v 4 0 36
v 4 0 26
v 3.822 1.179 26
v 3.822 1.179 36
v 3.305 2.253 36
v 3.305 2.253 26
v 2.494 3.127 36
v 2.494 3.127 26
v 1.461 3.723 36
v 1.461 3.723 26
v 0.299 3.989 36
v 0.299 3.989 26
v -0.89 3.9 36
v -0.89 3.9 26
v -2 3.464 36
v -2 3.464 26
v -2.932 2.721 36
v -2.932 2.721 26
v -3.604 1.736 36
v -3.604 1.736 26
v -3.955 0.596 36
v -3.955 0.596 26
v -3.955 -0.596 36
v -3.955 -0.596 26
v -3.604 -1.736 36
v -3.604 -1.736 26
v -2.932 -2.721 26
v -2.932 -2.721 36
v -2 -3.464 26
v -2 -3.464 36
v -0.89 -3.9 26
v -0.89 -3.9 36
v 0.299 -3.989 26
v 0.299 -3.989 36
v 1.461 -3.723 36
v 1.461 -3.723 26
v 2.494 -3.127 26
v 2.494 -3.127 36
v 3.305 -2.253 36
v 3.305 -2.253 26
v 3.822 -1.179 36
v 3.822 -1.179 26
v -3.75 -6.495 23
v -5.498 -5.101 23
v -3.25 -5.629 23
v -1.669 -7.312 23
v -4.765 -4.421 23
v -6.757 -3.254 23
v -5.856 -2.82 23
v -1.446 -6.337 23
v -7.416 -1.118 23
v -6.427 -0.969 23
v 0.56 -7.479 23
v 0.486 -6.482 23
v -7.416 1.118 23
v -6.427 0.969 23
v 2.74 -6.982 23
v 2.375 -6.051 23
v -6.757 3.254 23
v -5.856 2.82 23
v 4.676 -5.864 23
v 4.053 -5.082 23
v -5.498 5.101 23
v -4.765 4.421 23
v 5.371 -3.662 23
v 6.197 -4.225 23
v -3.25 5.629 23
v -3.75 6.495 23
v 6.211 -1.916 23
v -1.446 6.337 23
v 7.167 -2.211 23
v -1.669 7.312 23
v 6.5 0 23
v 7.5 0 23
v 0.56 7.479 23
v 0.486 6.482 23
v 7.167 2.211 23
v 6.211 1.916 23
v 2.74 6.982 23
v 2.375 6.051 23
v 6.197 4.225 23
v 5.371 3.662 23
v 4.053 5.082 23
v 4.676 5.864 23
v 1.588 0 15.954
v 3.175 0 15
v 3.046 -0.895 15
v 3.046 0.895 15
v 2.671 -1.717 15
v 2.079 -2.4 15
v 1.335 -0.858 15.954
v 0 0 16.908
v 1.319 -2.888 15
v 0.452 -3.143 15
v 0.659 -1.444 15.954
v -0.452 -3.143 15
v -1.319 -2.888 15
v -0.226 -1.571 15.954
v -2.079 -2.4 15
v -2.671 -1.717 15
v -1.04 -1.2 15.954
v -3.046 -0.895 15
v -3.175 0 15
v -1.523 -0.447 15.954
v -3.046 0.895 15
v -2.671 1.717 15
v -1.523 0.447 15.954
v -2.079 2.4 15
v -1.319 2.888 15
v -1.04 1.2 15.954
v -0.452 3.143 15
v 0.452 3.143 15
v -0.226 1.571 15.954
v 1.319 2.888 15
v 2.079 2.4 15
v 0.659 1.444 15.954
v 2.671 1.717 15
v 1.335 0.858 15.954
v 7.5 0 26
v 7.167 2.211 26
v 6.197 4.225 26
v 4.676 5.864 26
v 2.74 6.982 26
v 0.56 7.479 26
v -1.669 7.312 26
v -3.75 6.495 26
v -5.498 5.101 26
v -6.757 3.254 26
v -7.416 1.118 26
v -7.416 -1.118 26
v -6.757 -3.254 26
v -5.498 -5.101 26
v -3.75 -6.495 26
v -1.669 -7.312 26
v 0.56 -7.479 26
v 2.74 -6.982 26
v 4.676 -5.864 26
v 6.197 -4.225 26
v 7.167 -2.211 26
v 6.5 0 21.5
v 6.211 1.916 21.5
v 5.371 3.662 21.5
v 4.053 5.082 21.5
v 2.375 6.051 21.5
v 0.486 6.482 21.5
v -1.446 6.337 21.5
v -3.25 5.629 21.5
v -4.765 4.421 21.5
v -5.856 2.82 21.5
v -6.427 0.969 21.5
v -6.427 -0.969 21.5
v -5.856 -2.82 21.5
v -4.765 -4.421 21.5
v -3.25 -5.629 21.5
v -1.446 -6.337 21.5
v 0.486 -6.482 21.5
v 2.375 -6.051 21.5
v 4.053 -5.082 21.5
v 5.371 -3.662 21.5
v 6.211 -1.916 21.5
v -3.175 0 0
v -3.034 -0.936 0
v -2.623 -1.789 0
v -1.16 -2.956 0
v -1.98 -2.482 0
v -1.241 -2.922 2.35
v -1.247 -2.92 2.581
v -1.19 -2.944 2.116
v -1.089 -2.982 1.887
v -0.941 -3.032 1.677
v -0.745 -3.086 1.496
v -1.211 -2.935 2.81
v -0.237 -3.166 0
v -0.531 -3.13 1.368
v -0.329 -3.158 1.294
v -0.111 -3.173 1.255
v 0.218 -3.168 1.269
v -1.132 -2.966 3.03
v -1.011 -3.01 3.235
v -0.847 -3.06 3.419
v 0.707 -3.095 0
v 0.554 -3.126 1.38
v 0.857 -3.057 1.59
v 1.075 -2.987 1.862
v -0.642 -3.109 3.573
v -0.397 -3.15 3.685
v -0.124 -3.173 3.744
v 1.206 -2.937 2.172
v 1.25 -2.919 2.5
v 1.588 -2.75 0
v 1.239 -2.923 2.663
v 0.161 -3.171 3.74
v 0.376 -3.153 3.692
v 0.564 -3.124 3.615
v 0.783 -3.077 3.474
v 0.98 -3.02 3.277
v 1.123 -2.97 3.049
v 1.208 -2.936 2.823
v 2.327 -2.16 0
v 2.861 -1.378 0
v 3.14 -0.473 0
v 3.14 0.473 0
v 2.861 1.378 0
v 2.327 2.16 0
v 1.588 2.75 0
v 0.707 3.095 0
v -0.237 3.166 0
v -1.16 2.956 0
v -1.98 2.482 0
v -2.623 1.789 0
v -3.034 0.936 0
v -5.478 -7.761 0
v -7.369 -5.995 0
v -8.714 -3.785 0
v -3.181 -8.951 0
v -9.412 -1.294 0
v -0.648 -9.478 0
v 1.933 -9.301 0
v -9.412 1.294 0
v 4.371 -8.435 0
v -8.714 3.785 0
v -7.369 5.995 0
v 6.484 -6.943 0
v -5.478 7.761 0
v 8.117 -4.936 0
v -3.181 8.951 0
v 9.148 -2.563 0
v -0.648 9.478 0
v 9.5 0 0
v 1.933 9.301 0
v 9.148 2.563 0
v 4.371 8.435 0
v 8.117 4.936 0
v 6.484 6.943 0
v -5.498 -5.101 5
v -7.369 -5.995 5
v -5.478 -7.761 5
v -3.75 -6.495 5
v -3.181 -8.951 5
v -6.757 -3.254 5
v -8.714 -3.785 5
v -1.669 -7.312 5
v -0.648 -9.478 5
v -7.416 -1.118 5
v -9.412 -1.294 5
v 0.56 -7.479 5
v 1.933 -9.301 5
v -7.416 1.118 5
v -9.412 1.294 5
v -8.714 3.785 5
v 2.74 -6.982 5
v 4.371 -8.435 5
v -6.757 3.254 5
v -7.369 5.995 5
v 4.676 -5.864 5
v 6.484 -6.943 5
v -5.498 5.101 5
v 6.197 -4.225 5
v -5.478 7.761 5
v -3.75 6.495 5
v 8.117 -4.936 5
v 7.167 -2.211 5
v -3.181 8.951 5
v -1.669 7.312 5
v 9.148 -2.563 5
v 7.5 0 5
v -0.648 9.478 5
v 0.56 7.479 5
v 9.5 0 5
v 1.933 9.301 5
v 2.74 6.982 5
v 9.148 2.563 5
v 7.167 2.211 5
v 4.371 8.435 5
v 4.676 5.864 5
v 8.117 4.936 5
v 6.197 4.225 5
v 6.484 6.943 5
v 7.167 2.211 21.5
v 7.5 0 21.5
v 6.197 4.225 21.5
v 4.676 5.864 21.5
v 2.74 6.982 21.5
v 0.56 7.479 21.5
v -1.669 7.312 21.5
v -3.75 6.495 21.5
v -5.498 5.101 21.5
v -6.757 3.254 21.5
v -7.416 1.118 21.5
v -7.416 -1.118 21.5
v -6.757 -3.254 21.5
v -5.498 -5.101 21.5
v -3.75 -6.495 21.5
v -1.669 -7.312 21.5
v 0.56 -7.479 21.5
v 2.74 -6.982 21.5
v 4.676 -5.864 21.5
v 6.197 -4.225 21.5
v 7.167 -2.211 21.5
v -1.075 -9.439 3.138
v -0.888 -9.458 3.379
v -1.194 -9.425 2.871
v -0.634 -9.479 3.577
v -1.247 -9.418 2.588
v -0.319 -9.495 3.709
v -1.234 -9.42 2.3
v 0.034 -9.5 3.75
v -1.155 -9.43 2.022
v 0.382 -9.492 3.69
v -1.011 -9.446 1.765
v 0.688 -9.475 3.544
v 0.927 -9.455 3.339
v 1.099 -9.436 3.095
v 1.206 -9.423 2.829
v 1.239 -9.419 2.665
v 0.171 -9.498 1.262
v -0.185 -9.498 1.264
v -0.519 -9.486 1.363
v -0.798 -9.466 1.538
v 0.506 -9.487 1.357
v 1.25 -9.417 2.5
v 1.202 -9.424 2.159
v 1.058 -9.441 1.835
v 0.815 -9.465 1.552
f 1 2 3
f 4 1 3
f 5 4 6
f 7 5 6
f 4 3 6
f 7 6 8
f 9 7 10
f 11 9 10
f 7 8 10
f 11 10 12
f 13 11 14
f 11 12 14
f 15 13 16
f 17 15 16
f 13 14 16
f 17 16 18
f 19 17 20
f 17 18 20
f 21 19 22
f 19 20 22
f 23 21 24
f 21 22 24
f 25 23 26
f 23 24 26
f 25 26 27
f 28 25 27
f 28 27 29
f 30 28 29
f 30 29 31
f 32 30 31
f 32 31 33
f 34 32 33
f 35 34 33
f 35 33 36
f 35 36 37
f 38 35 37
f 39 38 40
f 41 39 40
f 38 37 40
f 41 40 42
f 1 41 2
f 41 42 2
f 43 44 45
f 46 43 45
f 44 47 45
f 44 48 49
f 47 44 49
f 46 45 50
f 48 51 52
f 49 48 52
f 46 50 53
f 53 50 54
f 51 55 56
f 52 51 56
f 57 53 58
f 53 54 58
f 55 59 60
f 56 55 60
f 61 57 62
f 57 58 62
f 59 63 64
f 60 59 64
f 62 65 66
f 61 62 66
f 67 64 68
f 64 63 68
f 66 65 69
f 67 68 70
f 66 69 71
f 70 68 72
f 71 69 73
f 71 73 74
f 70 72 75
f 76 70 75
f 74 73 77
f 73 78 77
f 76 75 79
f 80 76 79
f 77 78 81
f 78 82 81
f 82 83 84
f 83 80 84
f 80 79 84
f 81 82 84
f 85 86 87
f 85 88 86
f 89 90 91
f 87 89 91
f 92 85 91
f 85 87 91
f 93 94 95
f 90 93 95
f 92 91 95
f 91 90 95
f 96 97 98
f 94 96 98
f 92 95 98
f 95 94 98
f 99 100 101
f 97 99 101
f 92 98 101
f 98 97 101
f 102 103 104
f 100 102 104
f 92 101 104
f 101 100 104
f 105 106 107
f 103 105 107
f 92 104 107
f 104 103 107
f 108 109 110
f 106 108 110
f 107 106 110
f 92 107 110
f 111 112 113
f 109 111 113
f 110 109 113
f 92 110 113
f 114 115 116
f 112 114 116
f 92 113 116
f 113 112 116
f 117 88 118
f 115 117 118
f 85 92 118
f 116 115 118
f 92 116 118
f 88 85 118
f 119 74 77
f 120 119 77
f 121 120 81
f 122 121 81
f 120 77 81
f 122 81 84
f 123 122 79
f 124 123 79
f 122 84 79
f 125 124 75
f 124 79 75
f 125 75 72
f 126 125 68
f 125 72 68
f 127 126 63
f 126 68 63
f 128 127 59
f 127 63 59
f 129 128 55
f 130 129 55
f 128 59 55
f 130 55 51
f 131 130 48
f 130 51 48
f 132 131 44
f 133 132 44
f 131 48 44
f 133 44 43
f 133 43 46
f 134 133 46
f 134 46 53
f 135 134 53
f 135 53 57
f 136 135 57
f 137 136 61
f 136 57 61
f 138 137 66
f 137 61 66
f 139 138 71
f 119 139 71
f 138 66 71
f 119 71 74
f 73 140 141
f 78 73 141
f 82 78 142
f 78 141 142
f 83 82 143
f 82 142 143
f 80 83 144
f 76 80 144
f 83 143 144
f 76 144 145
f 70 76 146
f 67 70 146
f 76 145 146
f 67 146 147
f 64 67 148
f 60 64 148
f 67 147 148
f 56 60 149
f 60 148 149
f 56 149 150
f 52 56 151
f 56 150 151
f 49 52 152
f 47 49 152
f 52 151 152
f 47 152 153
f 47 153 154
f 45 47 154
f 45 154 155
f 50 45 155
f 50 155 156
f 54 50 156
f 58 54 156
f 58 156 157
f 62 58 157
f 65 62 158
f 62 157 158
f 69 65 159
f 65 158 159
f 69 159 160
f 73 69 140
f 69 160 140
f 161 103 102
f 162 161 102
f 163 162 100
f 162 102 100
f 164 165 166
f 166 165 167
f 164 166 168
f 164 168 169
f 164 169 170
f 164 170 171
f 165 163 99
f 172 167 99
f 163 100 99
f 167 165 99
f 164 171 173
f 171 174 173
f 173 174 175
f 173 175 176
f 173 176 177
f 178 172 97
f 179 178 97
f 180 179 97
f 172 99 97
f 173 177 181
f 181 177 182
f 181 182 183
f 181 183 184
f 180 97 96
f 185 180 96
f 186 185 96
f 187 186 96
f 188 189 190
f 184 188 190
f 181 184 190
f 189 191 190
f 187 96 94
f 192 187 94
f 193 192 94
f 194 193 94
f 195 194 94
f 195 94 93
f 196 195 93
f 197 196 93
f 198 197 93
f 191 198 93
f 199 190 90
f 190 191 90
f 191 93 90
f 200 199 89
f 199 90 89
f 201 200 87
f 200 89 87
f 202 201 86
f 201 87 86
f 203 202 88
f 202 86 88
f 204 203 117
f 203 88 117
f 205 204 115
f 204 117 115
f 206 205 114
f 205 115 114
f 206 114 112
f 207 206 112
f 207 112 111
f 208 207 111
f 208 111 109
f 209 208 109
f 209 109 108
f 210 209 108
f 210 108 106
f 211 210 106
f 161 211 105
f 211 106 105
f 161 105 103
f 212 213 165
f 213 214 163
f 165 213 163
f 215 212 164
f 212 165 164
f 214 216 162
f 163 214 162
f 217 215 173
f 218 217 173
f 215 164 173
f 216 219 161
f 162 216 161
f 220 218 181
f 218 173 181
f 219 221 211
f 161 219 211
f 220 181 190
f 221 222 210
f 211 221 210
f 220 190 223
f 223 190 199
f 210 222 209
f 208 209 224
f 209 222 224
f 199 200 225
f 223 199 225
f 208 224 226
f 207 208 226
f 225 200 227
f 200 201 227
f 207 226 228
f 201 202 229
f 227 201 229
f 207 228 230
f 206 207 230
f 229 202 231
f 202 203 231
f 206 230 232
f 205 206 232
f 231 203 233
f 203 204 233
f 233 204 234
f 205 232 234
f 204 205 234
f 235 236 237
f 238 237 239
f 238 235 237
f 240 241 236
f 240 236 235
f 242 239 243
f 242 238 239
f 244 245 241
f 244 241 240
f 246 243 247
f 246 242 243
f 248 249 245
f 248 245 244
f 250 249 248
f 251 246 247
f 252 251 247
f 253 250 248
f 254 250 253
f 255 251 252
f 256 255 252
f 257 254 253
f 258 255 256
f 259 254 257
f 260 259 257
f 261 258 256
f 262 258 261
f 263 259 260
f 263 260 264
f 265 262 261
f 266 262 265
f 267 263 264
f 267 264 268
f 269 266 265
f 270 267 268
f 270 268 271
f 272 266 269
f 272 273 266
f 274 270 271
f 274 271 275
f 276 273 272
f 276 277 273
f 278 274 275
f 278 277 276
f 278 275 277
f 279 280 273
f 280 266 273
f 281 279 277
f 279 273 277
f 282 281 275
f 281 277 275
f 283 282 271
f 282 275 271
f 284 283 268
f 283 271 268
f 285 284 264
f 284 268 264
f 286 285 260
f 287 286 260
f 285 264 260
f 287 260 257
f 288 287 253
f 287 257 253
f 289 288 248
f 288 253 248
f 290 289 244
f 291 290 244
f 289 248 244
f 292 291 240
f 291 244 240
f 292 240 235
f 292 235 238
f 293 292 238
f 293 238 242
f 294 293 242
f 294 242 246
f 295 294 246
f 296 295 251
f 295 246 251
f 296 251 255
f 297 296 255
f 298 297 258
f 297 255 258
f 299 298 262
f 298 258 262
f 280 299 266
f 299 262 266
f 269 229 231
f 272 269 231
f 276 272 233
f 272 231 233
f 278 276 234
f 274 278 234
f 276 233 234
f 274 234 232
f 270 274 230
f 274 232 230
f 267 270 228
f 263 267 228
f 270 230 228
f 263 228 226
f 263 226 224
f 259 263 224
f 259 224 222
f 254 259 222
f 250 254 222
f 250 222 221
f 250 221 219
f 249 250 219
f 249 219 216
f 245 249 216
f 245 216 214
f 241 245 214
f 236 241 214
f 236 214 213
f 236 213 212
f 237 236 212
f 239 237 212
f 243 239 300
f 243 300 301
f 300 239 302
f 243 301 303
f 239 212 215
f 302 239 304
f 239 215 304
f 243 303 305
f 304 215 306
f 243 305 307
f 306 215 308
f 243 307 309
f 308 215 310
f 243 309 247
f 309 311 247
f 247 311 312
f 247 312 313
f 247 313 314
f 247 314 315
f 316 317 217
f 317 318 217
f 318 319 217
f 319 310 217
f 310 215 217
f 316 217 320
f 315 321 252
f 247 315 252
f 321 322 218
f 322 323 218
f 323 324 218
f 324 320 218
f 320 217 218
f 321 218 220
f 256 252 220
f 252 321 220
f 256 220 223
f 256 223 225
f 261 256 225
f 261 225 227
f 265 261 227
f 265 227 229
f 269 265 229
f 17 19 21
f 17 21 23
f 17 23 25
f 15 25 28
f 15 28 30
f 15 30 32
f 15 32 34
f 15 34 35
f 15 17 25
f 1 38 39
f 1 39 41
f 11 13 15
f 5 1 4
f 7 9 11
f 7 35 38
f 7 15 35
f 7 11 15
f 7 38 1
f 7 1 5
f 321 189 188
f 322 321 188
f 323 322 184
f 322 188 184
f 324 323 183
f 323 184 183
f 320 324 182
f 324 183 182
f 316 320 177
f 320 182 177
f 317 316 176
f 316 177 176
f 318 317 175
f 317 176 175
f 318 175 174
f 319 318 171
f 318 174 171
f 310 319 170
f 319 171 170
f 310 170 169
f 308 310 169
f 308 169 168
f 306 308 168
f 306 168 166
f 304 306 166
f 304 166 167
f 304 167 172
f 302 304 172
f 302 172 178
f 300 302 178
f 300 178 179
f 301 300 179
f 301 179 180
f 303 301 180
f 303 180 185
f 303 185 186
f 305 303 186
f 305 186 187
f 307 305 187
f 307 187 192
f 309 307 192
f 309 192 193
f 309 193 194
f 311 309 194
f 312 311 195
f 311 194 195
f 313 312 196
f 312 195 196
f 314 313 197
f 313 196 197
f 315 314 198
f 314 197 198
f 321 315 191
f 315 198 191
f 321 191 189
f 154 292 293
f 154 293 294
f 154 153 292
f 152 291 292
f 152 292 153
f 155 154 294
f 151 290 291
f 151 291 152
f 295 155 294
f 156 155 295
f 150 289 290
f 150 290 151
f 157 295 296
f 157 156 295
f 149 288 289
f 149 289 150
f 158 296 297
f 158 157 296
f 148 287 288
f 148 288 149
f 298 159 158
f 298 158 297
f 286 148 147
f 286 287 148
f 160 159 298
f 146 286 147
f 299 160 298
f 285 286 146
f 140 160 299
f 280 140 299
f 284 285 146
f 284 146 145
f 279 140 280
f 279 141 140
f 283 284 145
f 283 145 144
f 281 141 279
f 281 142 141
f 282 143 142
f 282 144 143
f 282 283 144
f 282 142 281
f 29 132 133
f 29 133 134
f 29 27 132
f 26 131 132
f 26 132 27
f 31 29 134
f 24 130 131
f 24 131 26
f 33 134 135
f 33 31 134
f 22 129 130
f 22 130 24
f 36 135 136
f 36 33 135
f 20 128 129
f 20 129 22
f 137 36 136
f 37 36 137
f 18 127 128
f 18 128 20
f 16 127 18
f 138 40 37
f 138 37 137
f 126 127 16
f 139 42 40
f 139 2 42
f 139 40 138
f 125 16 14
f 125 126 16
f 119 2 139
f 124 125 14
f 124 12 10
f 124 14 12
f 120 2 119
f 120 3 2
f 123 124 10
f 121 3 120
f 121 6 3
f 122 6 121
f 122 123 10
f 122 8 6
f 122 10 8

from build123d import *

# Parameters (mm, degrees)
F0_R      = 7.5
F1_DEPTH  = 21
F2_R      = 9.5
F3_DEPTH  = 5
F5_D      = 6.35
F5_DEPTH  = 15
F5_TIP    = 1.9077324654
F7_D      = 2.5
F7_DEPTH  = 9.501
F8_R      = 7.5
F9_DEPTH  = 5
F10_R     = 4
F11_DEPTH = 10
F13_R     = 7.5
F13_R_2   = 6.5
F14_DEPTH = 1.5


with BuildPart() as f1:
    # F0 (on Top) → F1 (new body)
    with BuildSketch(Plane.XY):
        Circle(F0_R)
    extrude(amount=F1_DEPTH)

    # F2 (on Top) → F3 (join)
    with BuildSketch(Plane.XY):
        Circle(F2_R)
    extrude(amount=F3_DEPTH)

    # F5
    with Locations(Plane(origin=(0, 0, 0), x_dir=(1, 0, 0), z_dir=(0, 0, -1))):
        with Locations((0, 0)):
            Hole(F5_D / 2, depth=F5_DEPTH)
            with Locations((0, 0, -(F5_DEPTH + F5_TIP / 2))):  # 118° drill point
                Cone(0, F5_D / 2, F5_TIP, mode=Mode.SUBTRACT)

    # F7 (through all, one way)
    with BuildSketch(Plane(origin=(0, 0, 0), x_dir=(1, 0, 0), z_dir=(0, 1, 0))):
        with Locations((0, -2.5)):
            Circle(F7_D / 2)
    extrude(amount=-F7_DEPTH, mode=Mode.SUBTRACT)

    # F8 (on face) → F9 (join)
    with BuildSketch(Plane.XY.offset(21)):
        Circle(F8_R)
    extrude(amount=F9_DEPTH)

    # F10 (on face) → F11 (join)
    with BuildSketch(Plane.XY.offset(26)):
        Circle(F10_R)
    extrude(amount=F11_DEPTH)

    # F13 (on offset) → F14 (cut)
    with BuildSketch(Plane.XY.offset(21.5)):
        Circle(F13_R)
        Circle(F13_R_2, mode=Mode.SUBTRACT)
    extrude(amount=F14_DEPTH, mode=Mode.SUBTRACT)


solid = f1.part
